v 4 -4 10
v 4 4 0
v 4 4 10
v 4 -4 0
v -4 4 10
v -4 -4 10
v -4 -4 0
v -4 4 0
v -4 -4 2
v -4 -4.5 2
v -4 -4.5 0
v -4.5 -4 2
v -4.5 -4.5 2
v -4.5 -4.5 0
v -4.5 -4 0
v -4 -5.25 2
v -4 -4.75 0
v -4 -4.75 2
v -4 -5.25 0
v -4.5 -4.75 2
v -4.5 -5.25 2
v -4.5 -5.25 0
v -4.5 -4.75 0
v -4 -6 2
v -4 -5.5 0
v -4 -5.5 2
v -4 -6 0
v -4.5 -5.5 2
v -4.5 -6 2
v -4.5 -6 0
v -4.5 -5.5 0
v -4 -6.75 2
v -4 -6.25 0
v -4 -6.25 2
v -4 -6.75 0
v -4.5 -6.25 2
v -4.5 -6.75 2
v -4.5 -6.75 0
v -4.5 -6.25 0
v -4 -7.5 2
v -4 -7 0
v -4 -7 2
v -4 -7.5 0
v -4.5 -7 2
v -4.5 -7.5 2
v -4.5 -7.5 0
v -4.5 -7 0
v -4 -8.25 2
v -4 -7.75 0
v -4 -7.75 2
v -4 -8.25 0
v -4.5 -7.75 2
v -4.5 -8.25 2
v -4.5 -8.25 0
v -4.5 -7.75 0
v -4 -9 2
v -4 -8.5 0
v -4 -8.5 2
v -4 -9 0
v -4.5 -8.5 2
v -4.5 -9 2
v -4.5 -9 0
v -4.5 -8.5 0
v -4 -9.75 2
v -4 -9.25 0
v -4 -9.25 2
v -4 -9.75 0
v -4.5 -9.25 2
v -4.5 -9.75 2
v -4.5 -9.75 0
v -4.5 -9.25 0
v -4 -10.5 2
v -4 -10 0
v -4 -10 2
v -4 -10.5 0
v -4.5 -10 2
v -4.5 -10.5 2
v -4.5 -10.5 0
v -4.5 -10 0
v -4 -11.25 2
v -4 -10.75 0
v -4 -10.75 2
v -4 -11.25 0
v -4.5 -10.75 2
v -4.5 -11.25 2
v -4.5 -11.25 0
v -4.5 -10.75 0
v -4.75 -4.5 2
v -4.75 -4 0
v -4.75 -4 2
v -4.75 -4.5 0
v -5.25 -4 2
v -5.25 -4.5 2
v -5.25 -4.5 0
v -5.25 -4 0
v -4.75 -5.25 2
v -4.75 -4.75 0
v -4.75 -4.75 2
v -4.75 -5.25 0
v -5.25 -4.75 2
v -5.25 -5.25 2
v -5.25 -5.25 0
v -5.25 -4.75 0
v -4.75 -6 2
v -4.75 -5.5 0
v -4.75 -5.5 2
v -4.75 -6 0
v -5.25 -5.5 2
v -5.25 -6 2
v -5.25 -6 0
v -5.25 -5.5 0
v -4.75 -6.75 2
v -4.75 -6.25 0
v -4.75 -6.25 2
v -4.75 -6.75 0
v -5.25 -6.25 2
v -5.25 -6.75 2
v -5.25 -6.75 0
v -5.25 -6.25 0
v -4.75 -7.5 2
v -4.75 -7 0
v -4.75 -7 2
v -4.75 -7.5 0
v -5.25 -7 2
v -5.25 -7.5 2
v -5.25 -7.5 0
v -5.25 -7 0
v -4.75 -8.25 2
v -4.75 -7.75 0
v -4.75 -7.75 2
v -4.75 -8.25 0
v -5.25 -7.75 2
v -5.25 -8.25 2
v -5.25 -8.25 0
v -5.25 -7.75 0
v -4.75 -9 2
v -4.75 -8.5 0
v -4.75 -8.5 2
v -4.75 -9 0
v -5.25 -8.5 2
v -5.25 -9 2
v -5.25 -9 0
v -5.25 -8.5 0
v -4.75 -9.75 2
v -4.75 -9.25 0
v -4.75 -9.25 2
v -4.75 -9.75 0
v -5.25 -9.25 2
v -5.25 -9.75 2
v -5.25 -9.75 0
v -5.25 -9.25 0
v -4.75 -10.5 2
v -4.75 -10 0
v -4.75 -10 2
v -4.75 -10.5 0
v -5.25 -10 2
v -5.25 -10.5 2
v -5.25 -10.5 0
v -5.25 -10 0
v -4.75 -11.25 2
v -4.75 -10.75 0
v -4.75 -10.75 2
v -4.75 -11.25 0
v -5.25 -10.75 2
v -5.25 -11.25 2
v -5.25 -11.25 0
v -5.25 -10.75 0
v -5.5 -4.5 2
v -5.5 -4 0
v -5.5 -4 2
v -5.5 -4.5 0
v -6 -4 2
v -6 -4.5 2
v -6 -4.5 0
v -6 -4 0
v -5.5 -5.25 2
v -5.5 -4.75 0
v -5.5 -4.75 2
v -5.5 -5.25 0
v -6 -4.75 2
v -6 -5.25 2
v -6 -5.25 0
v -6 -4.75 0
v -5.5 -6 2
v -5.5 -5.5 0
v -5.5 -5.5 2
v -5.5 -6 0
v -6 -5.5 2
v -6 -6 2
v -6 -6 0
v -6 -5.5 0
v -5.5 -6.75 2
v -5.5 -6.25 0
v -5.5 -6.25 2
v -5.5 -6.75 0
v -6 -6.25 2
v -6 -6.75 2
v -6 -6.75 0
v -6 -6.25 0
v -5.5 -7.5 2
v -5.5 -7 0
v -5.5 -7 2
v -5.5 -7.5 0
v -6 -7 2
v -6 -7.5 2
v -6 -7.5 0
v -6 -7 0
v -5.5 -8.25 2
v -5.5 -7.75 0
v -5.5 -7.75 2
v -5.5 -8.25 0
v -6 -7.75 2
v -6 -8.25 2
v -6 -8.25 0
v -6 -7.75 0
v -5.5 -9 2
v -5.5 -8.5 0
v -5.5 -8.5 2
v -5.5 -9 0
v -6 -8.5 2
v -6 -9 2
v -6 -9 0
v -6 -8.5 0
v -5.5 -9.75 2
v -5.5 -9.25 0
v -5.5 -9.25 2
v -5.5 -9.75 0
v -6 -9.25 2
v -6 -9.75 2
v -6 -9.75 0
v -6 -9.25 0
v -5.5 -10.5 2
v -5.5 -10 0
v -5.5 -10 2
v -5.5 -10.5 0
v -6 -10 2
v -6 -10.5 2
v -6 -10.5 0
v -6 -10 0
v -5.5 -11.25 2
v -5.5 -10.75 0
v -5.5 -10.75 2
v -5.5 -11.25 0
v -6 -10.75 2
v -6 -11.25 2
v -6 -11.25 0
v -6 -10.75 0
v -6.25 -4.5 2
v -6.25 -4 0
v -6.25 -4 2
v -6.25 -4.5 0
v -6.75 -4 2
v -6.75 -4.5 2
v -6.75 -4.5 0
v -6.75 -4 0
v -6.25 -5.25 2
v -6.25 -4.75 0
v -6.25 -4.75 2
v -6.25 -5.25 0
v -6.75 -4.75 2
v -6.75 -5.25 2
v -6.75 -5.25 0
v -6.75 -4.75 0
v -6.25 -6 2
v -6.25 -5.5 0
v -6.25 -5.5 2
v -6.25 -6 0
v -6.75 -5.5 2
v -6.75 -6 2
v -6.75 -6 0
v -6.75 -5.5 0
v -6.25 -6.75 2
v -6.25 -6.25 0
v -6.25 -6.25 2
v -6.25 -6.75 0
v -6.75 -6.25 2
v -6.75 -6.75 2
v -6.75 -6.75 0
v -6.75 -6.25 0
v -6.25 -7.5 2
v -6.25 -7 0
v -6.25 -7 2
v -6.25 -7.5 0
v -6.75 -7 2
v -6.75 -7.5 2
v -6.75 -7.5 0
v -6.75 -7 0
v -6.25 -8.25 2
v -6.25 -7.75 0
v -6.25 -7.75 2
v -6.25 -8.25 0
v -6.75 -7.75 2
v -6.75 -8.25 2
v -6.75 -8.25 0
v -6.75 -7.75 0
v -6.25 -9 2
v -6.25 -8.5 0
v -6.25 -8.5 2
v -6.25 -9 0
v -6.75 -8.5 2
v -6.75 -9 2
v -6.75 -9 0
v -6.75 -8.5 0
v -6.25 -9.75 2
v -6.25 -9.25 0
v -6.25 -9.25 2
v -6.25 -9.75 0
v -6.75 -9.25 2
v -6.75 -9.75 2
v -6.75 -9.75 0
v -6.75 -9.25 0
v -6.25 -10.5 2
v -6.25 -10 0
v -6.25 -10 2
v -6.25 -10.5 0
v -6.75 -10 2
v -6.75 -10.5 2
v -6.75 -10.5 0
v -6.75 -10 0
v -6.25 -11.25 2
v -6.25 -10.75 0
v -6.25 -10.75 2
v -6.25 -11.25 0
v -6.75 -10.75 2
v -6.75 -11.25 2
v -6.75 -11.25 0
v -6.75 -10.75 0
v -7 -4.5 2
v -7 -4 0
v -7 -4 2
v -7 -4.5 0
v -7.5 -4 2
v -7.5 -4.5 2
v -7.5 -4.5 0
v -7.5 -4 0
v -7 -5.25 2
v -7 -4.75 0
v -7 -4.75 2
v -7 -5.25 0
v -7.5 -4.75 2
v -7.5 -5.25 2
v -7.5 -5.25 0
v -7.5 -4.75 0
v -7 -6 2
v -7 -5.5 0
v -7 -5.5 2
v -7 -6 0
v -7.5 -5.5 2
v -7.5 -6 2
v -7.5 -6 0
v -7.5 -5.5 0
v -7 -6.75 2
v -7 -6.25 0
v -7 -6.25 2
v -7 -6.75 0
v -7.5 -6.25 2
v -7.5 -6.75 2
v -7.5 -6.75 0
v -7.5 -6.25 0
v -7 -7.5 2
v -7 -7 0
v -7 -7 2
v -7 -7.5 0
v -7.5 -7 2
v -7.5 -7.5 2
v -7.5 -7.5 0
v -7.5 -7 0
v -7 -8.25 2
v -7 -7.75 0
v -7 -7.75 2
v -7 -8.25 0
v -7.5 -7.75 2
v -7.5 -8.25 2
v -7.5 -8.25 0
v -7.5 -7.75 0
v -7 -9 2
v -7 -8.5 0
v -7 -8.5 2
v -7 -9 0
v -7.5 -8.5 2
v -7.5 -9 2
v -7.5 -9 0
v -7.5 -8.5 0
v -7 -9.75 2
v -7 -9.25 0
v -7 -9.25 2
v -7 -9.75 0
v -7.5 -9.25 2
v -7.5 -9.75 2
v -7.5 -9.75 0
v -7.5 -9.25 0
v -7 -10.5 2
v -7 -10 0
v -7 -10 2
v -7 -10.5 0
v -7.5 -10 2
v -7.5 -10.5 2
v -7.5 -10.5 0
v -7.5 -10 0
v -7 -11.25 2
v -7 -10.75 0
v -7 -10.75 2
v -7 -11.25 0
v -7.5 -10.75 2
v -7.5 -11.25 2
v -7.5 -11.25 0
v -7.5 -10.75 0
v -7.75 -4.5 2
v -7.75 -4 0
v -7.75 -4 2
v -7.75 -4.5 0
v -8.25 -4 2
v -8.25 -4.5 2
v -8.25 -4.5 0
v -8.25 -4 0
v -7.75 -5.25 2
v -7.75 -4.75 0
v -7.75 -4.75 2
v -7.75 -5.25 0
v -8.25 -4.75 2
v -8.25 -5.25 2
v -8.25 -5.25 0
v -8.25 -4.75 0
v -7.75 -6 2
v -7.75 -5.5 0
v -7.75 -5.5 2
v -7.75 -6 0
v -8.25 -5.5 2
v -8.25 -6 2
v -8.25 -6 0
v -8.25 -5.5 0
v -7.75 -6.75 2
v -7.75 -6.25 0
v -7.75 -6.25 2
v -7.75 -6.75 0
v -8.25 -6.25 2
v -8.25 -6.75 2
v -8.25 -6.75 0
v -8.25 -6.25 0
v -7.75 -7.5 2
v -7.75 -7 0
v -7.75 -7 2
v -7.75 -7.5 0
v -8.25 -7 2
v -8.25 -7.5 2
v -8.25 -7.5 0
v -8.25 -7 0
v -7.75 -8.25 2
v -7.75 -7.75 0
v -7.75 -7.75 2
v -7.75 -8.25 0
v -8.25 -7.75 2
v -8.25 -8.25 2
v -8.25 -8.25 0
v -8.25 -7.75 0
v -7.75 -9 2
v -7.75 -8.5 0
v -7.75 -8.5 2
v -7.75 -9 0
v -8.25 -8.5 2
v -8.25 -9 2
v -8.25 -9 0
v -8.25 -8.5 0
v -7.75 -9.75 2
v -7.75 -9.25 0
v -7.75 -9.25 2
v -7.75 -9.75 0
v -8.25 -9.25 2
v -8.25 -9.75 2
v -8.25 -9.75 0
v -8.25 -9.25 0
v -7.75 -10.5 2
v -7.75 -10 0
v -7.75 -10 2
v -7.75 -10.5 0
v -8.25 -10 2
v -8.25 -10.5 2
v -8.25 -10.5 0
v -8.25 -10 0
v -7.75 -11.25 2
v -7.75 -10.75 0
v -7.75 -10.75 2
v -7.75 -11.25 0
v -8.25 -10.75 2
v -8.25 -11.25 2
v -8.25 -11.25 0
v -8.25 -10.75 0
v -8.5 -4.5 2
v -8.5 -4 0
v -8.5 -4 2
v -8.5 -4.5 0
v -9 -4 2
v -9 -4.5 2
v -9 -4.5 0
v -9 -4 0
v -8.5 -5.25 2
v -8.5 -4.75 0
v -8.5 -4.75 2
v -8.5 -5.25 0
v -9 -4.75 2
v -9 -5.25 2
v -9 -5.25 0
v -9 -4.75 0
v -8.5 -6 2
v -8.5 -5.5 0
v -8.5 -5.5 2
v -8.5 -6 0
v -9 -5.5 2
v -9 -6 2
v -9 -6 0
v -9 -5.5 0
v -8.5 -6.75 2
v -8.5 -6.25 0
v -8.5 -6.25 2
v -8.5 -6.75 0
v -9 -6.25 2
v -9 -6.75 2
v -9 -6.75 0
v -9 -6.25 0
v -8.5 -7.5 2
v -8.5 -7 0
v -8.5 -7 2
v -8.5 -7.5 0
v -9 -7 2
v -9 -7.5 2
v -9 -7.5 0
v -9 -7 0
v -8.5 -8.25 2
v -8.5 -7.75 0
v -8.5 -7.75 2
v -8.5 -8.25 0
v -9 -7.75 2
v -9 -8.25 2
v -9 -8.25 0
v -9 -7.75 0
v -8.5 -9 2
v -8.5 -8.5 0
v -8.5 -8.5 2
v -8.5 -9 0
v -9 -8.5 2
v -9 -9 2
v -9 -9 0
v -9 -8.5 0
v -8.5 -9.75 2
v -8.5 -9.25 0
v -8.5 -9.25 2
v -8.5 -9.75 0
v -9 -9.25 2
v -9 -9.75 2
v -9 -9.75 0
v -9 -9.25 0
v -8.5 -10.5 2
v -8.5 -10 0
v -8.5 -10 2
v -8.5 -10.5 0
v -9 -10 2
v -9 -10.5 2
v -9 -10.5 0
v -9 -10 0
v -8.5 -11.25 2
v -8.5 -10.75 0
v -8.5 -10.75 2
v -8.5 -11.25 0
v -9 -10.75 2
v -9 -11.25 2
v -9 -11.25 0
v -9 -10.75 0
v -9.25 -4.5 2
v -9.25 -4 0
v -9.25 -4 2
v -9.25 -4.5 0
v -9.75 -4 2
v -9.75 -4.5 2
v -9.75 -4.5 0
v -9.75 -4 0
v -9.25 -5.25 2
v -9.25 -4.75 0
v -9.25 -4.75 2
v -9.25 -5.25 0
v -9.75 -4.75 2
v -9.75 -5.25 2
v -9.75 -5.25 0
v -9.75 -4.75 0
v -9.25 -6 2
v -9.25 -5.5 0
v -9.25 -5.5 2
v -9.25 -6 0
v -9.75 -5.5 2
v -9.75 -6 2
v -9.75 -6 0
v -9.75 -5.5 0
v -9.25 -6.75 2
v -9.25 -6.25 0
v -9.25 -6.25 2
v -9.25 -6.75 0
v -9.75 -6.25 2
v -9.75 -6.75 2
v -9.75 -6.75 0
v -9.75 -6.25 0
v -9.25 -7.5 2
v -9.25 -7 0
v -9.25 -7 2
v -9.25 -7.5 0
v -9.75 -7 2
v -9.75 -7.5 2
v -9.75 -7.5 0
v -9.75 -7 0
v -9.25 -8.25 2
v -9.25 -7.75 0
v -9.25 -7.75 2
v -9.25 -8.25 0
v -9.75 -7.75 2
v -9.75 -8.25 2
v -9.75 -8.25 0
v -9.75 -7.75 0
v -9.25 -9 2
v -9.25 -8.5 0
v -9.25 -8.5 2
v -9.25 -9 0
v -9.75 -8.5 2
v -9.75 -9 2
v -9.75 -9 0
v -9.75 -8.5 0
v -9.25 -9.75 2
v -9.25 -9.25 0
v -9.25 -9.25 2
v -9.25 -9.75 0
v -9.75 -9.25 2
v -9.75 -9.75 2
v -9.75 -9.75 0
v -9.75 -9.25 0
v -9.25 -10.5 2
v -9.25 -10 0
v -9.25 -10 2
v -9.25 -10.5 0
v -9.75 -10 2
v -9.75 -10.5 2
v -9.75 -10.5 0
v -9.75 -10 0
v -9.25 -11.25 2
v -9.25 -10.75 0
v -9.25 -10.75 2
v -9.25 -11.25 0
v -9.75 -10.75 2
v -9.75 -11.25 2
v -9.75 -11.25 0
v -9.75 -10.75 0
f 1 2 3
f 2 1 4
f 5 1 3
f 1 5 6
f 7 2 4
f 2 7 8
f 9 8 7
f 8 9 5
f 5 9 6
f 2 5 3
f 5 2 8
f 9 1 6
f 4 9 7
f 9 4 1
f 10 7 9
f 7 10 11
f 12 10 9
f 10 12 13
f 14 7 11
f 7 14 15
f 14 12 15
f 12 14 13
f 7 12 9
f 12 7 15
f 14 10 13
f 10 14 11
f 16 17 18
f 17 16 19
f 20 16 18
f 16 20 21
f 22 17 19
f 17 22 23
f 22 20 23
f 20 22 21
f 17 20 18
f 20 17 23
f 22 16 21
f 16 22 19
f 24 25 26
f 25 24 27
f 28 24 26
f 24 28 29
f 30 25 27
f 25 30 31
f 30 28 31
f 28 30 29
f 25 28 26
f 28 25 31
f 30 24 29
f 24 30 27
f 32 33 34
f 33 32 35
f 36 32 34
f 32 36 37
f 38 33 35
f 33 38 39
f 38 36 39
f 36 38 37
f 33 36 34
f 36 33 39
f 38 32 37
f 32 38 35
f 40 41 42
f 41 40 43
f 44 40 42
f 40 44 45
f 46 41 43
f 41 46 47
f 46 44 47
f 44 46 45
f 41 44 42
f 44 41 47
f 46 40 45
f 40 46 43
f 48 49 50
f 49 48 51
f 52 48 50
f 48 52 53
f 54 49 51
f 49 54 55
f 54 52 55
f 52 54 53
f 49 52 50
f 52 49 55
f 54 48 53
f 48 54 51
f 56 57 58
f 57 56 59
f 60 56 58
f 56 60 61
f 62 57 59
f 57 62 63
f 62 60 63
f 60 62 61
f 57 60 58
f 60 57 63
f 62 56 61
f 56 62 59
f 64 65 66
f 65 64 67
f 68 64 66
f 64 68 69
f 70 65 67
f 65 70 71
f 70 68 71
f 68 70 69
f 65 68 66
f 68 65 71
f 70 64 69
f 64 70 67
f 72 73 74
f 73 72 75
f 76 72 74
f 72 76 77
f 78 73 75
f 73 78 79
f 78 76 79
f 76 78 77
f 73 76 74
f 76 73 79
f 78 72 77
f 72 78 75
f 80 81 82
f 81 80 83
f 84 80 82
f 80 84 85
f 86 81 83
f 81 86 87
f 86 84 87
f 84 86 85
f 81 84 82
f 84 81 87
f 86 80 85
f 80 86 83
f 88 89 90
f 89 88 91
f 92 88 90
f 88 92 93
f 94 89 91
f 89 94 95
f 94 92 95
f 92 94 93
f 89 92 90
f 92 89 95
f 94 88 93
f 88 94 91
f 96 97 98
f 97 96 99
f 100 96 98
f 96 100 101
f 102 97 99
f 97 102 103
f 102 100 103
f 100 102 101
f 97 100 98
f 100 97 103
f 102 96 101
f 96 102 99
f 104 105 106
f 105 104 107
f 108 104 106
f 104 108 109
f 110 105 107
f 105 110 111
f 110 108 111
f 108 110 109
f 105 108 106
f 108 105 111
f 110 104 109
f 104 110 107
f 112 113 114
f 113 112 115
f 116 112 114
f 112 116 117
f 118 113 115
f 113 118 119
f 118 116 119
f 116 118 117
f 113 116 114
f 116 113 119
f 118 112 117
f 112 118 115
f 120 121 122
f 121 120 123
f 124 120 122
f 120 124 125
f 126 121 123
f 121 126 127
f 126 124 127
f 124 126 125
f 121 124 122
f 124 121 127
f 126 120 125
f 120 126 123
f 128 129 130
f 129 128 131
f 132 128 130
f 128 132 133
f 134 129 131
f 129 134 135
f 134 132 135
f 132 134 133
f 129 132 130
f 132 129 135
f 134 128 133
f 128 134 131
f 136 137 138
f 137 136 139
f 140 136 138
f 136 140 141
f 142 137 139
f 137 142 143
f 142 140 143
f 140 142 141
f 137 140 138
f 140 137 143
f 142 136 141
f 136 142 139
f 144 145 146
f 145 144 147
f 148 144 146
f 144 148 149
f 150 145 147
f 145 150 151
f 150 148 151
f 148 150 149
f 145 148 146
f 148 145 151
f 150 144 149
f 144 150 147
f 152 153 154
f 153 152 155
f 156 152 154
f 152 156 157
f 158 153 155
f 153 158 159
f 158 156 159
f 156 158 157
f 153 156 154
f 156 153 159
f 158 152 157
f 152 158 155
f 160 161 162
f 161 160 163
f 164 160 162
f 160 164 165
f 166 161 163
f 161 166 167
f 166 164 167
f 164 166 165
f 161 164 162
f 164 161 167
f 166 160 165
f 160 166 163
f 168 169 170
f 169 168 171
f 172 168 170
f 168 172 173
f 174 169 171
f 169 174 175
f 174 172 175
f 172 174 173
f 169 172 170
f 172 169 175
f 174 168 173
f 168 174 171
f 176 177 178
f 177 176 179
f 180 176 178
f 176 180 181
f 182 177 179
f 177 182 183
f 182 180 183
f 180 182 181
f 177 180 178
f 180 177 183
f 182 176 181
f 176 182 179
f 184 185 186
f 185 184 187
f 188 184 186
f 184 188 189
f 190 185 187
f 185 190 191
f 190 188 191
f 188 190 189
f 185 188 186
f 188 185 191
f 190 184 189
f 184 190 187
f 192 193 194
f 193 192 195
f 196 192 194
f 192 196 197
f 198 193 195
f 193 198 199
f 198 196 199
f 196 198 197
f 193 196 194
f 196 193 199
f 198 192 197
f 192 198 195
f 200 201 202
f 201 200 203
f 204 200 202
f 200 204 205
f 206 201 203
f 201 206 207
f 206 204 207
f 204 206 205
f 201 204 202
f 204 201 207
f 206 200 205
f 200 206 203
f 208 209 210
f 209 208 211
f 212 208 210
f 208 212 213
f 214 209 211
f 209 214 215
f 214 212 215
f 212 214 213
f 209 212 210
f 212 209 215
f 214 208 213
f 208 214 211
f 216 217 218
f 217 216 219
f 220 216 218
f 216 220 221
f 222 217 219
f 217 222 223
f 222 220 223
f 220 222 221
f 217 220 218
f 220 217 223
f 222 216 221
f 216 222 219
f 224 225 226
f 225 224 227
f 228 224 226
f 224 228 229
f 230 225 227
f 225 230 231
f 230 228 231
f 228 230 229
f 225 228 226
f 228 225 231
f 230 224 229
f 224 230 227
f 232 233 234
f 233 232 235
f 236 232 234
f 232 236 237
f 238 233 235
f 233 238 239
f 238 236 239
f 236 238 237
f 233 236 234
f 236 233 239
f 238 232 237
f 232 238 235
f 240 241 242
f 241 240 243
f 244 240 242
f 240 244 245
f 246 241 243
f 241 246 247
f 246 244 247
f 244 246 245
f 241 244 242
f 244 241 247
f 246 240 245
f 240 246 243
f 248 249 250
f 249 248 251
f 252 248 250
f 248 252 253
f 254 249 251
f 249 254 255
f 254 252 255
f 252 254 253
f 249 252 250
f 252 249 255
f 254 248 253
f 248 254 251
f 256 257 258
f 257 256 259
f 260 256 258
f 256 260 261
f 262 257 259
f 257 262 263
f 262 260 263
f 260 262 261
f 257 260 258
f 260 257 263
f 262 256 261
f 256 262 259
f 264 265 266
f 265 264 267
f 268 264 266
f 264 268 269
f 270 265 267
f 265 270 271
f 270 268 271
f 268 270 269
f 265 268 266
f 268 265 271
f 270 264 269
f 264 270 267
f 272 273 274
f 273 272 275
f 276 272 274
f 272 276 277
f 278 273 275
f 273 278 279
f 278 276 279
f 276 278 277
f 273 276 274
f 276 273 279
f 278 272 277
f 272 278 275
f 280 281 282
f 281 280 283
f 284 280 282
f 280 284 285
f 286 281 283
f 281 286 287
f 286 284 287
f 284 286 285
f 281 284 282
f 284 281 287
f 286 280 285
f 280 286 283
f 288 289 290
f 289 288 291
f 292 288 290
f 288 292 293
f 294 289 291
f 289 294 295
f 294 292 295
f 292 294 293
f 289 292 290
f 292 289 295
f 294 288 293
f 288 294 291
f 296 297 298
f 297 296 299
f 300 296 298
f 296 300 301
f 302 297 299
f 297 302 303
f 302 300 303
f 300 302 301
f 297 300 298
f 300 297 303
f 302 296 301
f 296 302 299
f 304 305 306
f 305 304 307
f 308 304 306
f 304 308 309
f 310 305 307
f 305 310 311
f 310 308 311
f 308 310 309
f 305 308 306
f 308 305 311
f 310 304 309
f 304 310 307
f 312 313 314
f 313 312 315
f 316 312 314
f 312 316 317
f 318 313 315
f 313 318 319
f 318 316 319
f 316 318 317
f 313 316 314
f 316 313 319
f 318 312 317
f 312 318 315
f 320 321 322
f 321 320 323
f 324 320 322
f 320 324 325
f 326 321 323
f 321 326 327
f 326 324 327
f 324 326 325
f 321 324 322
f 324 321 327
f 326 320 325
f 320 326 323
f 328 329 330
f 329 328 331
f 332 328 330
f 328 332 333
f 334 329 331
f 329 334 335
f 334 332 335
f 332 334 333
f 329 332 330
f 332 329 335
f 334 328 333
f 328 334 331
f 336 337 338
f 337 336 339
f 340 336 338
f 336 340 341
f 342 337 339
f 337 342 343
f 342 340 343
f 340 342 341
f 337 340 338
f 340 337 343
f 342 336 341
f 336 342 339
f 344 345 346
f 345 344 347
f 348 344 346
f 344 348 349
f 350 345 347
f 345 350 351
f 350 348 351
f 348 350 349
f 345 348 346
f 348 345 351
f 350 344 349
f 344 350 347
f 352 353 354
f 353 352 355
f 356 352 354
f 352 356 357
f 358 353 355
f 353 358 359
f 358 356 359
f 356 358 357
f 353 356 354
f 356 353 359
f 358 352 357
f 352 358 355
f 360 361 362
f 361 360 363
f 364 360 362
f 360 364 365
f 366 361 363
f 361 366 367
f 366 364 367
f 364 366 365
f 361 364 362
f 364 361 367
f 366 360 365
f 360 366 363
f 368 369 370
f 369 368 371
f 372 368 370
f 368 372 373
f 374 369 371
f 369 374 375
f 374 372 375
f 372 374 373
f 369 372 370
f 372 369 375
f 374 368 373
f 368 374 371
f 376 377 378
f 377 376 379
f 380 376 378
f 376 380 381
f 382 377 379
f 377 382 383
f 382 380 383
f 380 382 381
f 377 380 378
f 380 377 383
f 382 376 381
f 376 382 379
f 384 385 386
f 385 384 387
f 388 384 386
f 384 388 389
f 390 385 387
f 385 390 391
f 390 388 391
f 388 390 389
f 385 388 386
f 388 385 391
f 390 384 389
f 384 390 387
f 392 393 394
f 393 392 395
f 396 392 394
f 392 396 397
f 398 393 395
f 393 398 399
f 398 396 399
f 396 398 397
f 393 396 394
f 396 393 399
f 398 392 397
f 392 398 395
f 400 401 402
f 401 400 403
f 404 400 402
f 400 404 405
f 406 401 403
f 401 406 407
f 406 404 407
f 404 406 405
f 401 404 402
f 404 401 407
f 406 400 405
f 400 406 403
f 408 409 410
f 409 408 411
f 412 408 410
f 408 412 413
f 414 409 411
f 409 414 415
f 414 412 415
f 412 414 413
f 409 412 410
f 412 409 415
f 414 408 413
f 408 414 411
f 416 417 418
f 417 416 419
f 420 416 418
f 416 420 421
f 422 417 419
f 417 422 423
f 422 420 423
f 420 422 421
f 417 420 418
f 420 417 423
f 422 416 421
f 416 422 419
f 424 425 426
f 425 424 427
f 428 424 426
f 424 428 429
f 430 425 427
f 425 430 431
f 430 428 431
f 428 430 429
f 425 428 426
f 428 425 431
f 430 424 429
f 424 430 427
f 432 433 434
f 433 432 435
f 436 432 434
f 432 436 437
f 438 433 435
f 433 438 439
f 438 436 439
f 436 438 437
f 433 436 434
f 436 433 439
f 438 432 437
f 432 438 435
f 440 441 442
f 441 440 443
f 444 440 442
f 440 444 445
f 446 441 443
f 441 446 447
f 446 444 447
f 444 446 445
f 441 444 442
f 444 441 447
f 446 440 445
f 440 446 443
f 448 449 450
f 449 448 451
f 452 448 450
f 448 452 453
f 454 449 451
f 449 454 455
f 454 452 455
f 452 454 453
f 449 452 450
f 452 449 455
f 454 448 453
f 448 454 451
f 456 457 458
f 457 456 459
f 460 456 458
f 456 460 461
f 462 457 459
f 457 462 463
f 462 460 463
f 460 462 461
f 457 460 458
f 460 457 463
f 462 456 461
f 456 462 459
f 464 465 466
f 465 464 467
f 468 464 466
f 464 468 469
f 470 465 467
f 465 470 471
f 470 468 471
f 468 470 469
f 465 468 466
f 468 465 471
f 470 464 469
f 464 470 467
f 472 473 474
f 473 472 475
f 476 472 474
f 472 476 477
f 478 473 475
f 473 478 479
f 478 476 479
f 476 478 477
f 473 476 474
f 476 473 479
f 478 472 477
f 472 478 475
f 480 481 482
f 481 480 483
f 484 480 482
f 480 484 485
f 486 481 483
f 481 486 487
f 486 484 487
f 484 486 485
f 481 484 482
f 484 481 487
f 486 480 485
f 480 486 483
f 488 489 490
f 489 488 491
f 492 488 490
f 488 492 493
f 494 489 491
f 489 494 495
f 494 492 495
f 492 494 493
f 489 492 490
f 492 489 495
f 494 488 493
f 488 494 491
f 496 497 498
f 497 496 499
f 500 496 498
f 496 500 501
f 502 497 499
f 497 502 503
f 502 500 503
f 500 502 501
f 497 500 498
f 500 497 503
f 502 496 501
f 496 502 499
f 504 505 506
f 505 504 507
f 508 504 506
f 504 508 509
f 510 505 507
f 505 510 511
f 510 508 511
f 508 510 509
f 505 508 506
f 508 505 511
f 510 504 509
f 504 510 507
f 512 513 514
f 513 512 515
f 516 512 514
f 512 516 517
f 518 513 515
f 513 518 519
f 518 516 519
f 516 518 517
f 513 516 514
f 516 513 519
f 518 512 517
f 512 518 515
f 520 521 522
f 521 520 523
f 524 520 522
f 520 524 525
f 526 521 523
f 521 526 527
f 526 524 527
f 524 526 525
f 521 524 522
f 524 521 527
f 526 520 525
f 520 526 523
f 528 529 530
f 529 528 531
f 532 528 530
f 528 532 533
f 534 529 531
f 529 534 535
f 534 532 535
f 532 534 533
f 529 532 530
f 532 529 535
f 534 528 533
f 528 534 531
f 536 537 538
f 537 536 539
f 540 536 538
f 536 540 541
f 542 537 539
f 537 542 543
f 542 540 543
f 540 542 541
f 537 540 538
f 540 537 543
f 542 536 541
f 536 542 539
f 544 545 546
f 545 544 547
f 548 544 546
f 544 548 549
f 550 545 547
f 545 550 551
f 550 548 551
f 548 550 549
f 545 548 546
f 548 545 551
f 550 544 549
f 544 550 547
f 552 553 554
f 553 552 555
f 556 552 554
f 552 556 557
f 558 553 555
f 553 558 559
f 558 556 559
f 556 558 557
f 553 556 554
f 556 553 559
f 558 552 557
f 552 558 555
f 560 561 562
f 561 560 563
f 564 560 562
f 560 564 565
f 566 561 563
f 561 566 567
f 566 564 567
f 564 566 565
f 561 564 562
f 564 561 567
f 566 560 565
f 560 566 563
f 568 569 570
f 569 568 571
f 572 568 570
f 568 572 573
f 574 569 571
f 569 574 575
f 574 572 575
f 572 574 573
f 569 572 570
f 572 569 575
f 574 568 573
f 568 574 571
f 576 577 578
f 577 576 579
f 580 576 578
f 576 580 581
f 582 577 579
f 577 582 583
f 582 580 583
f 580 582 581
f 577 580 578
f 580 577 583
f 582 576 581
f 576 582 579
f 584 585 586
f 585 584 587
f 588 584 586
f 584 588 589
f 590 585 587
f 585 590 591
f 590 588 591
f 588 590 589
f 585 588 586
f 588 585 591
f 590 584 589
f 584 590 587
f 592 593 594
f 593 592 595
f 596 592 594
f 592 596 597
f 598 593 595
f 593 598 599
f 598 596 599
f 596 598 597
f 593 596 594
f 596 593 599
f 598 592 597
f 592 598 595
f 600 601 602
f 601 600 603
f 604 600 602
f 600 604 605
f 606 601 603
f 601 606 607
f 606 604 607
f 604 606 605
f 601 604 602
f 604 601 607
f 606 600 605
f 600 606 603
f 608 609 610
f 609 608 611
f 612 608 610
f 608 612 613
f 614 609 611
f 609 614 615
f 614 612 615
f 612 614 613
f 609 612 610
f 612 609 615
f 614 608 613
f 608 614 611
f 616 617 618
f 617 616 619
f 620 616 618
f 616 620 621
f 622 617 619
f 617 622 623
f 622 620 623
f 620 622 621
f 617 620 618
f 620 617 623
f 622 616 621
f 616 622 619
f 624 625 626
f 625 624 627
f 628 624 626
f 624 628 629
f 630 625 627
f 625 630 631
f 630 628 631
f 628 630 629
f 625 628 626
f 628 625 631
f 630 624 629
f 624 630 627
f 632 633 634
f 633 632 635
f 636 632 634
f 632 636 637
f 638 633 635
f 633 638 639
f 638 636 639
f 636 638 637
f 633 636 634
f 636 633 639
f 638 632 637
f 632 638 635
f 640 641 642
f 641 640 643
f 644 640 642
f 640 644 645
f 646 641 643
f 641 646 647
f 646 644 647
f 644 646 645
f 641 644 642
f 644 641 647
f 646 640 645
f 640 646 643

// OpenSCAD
translate([0, 0, 5]) color([0,1,0,0.9]) cube([8, 8, 10], center=true);
translate([-4.25, -4.25, 1]) color([1,0,0]) cube([0.5, 0.5, 2], center=true);
translate([-4.25, -5.0, 1]) color([1,0,0]) cube([0.5, 0.5, 2], center=true);
translate([-4.25, -5.75, 1]) color([1,0,0]) cube([0.5, 0.5, 2], center=true);
translate([-4.25, -6.5, 1]) color([1,0,0]) cube([0.5, 0.5, 2], center=true);
translate([-4.25, -7.25, 1]) color([1,0,0]) cube([0.5, 0.5, 2], center=true);
translate([-4.25, -8.0, 1]) color([1,0,0]) cube([0.5, 0.5, 2], center=true);
translate([-4.25, -8.75, 1]) color([1,0,0]) cube([0.5, 0.5, 2], center=true);
translate([-4.25, -9.5, 1]) color([1,0,0]) cube([0.5, 0.5, 2], center=true);
translate([-4.25, -10.25, 1]) color([1,0,0]) cube([0.5, 0.5, 2], center=true);
translate([-4.25, -11.0, 1]) color([1,0,0]) cube([0.5, 0.5, 2], center=true);
translate([-5.0, -4.25, 1]) color([1,0,0]) cube([0.5, 0.5, 2], center=true);
translate([-5.0, -5.0, 1]) color([1,0,0]) cube([0.5, 0.5, 2], center=true);
translate([-5.0, -5.75, 1]) color([1,0,0]) cube([0.5, 0.5, 2], center=true);
translate([-5.0, -6.5, 1]) color([1,0,0]) cube([0.5, 0.5, 2], center=true);
translate([-5.0, -7.25, 1]) color([1,0,0]) cube([0.5, 0.5, 2], center=true);
translate([-5.0, -8.0, 1]) color([1,0,0]) cube([0.5, 0.5, 2], center=true);
translate([-5.0, -8.75, 1]) color([1,0,0]) cube([0.5, 0.5, 2], center=true);
translate([-5.0, -9.5, 1]) color([1,0,0]) cube([0.5, 0.5, 2], center=true);
translate([-5.0, -10.25, 1]) color([1,0,0]) cube([0.5, 0.5, 2], center=true);
translate([-5.0, -11.0, 1]) color([1,0,0]) cube([0.5, 0.5, 2], center=true);
translate([-5.75, -4.25, 1]) color([1,0,0]) cube([0.5, 0.5, 2], center=true);
translate([-5.75, -5.0, 1]) color([1,0,0]) cube([0.5, 0.5, 2], center=true);
translate([-5.75, -5.75, 1]) color([1,0,0]) cube([0.5, 0.5, 2], center=true);
translate([-5.75, -6.5, 1]) color([1,0,0]) cube([0.5, 0.5, 2], center=true);
translate([-5.75, -7.25, 1]) color([1,0,0]) cube([0.5, 0.5, 2], center=true);
translate([-5.75, -8.0, 1]) color([1,0,0]) cube([0.5, 0.5, 2], center=true);
translate([-5.75, -8.75, 1]) color([1,0,0]) cube([0.5, 0.5, 2], center=true);
translate([-5.75, -9.5, 1]) color([1,0,0]) cube([0.5, 0.5, 2], center=true);
translate([-5.75, -10.25, 1]) color([1,0,0]) cube([0.5, 0.5, 2], center=true);
translate([-5.75, -11.0, 1]) color([1,0,0]) cube([0.5, 0.5, 2], center=true);
translate([-6.5, -4.25, 1]) color([1,0,0]) cube([0.5, 0.5, 2], center=true);
translate([-6.5, -5.0, 1]) color([1,0,0]) cube([0.5, 0.5, 2], center=true);
translate([-6.5, -5.75, 1]) color([1,0,0]) cube([0.5, 0.5, 2], center=true);
translate([-6.5, -6.5, 1]) color([1,0,0]) cube([0.5, 0.5, 2], center=true);
translate([-6.5, -7.25, 1]) color([1,0,0]) cube([0.5, 0.5, 2], center=true);
translate([-6.5, -8.0, 1]) color([1,0,0]) cube([0.5, 0.5, 2], center=true);
translate([-6.5, -8.75, 1]) color([1,0,0]) cube([0.5, 0.5, 2], center=true);
translate([-6.5, -9.5, 1]) color([1,0,0]) cube([0.5, 0.5, 2], center=true);
translate([-6.5, -10.25, 1]) color([1,0,0]) cube([0.5, 0.5, 2], center=true);
translate([-6.5, -11.0, 1]) color([1,0,0]) cube([0.5, 0.5, 2], center=true);
translate([-7.25, -4.25, 1]) color([1,0,0]) cube([0.5, 0.5, 2], center=true);
translate([-7.25, -5.0, 1]) color([1,0,0]) cube([0.5, 0.5, 2], center=true);
translate([-7.25, -5.75, 1]) color([1,0,0]) cube([0.5, 0.5, 2], center=true);
translate([-7.25, -6.5, 1]) color([1,0,0]) cube([0.5, 0.5, 2], center=true);
translate([-7.25, -7.25, 1]) color([1,0,0]) cube([0.5, 0.5, 2], center=true);
translate([-7.25, -8.0, 1]) color([1,0,0]) cube([0.5, 0.5, 2], center=true);
translate([-7.25, -8.75, 1]) color([1,0,0]) cube([0.5, 0.5, 2], center=true);
translate([-7.25, -9.5, 1]) color([1,0,0]) cube([0.5, 0.5, 2], center=true);
translate([-7.25, -10.25, 1]) color([1,0,0]) cube([0.5, 0.5, 2], center=true);
translate([-7.25, -11.0, 1]) color([1,0,0]) cube([0.5, 0.5, 2], center=true);
translate([-8.0, -4.25, 1]) color([1,0,0]) cube([0.5, 0.5, 2], center=true);
translate([-8.0, -5.0, 1]) color([1,0,0]) cube([0.5, 0.5, 2], center=true);
translate([-8.0, -5.75, 1]) color([1,0,0]) cube([0.5, 0.5, 2], center=true);
translate([-8.0, -6.5, 1]) color([1,0,0]) cube([0.5, 0.5, 2], center=true);
translate([-8.0, -7.25, 1]) color([1,0,0]) cube([0.5, 0.5, 2], center=true);
translate([-8.0, -8.0, 1]) color([1,0,0]) cube([0.5, 0.5, 2], center=true);
translate([-8.0, -8.75, 1]) color([1,0,0]) cube([0.5, 0.5, 2], center=true);
translate([-8.0, -9.5, 1]) color([1,0,0]) cube([0.5, 0.5, 2], center=true);
translate([-8.0, -10.25, 1]) color([1,0,0]) cube([0.5, 0.5, 2], center=true);
translate([-8.0, -11.0, 1]) color([1,0,0]) cube([0.5, 0.5, 2], center=true);
translate([-8.75, -4.25, 1]) color([1,0,0]) cube([0.5, 0.5, 2], center=true);
translate([-8.75, -5.0, 1]) color([1,0,0]) cube([0.5, 0.5, 2], center=true);
translate([-8.75, -5.75, 1]) color([1,0,0]) cube([0.5, 0.5, 2], center=true);
translate([-8.75, -6.5, 1]) color([1,0,0]) cube([0.5, 0.5, 2], center=true);
translate([-8.75, -7.25, 1]) color([1,0,0]) cube([0.5, 0.5, 2], center=true);
translate([-8.75, -8.0, 1]) color([1,0,0]) cube([0.5, 0.5, 2], center=true);
translate([-8.75, -8.75, 1]) color([1,0,0]) cube([0.5, 0.5, 2], center=true);
translate([-8.75, -9.5, 1]) color([1,0,0]) cube([0.5, 0.5, 2], center=true);
translate([-8.75, -10.25, 1]) color([1,0,0]) cube([0.5, 0.5, 2], center=true);
translate([-8.75, -11.0, 1]) color([1,0,0]) cube([0.5, 0.5, 2], center=true);
translate([-9.5, -4.25, 1]) color([1,0,0]) cube([0.5, 0.5, 2], center=true);
translate([-9.5, -5.0, 1]) color([1,0,0]) cube([0.5, 0.5, 2], center=true);
translate([-9.5, -5.75, 1]) color([1,0,0]) cube([0.5, 0.5, 2], center=true);
translate([-9.5, -6.5, 1]) color([1,0,0]) cube([0.5, 0.5, 2], center=true);
translate([-9.5, -7.25, 1]) color([1,0,0]) cube([0.5, 0.5, 2], center=true);
translate([-9.5, -8.0, 1]) color([1,0,0]) cube([0.5, 0.5, 2], center=true);
translate([-9.5, -8.75, 1]) color([1,0,0]) cube([0.5, 0.5, 2], center=true);
translate([-9.5, -9.5, 1]) color([1,0,0]) cube([0.5, 0.5, 2], center=true);
translate([-9.5, -10.25, 1]) color([1,0,0]) cube([0.5, 0.5, 2], center=true);
translate([-9.5, -11.0, 1]) color([1,0,0]) cube([0.5, 0.5, 2], center=true);
